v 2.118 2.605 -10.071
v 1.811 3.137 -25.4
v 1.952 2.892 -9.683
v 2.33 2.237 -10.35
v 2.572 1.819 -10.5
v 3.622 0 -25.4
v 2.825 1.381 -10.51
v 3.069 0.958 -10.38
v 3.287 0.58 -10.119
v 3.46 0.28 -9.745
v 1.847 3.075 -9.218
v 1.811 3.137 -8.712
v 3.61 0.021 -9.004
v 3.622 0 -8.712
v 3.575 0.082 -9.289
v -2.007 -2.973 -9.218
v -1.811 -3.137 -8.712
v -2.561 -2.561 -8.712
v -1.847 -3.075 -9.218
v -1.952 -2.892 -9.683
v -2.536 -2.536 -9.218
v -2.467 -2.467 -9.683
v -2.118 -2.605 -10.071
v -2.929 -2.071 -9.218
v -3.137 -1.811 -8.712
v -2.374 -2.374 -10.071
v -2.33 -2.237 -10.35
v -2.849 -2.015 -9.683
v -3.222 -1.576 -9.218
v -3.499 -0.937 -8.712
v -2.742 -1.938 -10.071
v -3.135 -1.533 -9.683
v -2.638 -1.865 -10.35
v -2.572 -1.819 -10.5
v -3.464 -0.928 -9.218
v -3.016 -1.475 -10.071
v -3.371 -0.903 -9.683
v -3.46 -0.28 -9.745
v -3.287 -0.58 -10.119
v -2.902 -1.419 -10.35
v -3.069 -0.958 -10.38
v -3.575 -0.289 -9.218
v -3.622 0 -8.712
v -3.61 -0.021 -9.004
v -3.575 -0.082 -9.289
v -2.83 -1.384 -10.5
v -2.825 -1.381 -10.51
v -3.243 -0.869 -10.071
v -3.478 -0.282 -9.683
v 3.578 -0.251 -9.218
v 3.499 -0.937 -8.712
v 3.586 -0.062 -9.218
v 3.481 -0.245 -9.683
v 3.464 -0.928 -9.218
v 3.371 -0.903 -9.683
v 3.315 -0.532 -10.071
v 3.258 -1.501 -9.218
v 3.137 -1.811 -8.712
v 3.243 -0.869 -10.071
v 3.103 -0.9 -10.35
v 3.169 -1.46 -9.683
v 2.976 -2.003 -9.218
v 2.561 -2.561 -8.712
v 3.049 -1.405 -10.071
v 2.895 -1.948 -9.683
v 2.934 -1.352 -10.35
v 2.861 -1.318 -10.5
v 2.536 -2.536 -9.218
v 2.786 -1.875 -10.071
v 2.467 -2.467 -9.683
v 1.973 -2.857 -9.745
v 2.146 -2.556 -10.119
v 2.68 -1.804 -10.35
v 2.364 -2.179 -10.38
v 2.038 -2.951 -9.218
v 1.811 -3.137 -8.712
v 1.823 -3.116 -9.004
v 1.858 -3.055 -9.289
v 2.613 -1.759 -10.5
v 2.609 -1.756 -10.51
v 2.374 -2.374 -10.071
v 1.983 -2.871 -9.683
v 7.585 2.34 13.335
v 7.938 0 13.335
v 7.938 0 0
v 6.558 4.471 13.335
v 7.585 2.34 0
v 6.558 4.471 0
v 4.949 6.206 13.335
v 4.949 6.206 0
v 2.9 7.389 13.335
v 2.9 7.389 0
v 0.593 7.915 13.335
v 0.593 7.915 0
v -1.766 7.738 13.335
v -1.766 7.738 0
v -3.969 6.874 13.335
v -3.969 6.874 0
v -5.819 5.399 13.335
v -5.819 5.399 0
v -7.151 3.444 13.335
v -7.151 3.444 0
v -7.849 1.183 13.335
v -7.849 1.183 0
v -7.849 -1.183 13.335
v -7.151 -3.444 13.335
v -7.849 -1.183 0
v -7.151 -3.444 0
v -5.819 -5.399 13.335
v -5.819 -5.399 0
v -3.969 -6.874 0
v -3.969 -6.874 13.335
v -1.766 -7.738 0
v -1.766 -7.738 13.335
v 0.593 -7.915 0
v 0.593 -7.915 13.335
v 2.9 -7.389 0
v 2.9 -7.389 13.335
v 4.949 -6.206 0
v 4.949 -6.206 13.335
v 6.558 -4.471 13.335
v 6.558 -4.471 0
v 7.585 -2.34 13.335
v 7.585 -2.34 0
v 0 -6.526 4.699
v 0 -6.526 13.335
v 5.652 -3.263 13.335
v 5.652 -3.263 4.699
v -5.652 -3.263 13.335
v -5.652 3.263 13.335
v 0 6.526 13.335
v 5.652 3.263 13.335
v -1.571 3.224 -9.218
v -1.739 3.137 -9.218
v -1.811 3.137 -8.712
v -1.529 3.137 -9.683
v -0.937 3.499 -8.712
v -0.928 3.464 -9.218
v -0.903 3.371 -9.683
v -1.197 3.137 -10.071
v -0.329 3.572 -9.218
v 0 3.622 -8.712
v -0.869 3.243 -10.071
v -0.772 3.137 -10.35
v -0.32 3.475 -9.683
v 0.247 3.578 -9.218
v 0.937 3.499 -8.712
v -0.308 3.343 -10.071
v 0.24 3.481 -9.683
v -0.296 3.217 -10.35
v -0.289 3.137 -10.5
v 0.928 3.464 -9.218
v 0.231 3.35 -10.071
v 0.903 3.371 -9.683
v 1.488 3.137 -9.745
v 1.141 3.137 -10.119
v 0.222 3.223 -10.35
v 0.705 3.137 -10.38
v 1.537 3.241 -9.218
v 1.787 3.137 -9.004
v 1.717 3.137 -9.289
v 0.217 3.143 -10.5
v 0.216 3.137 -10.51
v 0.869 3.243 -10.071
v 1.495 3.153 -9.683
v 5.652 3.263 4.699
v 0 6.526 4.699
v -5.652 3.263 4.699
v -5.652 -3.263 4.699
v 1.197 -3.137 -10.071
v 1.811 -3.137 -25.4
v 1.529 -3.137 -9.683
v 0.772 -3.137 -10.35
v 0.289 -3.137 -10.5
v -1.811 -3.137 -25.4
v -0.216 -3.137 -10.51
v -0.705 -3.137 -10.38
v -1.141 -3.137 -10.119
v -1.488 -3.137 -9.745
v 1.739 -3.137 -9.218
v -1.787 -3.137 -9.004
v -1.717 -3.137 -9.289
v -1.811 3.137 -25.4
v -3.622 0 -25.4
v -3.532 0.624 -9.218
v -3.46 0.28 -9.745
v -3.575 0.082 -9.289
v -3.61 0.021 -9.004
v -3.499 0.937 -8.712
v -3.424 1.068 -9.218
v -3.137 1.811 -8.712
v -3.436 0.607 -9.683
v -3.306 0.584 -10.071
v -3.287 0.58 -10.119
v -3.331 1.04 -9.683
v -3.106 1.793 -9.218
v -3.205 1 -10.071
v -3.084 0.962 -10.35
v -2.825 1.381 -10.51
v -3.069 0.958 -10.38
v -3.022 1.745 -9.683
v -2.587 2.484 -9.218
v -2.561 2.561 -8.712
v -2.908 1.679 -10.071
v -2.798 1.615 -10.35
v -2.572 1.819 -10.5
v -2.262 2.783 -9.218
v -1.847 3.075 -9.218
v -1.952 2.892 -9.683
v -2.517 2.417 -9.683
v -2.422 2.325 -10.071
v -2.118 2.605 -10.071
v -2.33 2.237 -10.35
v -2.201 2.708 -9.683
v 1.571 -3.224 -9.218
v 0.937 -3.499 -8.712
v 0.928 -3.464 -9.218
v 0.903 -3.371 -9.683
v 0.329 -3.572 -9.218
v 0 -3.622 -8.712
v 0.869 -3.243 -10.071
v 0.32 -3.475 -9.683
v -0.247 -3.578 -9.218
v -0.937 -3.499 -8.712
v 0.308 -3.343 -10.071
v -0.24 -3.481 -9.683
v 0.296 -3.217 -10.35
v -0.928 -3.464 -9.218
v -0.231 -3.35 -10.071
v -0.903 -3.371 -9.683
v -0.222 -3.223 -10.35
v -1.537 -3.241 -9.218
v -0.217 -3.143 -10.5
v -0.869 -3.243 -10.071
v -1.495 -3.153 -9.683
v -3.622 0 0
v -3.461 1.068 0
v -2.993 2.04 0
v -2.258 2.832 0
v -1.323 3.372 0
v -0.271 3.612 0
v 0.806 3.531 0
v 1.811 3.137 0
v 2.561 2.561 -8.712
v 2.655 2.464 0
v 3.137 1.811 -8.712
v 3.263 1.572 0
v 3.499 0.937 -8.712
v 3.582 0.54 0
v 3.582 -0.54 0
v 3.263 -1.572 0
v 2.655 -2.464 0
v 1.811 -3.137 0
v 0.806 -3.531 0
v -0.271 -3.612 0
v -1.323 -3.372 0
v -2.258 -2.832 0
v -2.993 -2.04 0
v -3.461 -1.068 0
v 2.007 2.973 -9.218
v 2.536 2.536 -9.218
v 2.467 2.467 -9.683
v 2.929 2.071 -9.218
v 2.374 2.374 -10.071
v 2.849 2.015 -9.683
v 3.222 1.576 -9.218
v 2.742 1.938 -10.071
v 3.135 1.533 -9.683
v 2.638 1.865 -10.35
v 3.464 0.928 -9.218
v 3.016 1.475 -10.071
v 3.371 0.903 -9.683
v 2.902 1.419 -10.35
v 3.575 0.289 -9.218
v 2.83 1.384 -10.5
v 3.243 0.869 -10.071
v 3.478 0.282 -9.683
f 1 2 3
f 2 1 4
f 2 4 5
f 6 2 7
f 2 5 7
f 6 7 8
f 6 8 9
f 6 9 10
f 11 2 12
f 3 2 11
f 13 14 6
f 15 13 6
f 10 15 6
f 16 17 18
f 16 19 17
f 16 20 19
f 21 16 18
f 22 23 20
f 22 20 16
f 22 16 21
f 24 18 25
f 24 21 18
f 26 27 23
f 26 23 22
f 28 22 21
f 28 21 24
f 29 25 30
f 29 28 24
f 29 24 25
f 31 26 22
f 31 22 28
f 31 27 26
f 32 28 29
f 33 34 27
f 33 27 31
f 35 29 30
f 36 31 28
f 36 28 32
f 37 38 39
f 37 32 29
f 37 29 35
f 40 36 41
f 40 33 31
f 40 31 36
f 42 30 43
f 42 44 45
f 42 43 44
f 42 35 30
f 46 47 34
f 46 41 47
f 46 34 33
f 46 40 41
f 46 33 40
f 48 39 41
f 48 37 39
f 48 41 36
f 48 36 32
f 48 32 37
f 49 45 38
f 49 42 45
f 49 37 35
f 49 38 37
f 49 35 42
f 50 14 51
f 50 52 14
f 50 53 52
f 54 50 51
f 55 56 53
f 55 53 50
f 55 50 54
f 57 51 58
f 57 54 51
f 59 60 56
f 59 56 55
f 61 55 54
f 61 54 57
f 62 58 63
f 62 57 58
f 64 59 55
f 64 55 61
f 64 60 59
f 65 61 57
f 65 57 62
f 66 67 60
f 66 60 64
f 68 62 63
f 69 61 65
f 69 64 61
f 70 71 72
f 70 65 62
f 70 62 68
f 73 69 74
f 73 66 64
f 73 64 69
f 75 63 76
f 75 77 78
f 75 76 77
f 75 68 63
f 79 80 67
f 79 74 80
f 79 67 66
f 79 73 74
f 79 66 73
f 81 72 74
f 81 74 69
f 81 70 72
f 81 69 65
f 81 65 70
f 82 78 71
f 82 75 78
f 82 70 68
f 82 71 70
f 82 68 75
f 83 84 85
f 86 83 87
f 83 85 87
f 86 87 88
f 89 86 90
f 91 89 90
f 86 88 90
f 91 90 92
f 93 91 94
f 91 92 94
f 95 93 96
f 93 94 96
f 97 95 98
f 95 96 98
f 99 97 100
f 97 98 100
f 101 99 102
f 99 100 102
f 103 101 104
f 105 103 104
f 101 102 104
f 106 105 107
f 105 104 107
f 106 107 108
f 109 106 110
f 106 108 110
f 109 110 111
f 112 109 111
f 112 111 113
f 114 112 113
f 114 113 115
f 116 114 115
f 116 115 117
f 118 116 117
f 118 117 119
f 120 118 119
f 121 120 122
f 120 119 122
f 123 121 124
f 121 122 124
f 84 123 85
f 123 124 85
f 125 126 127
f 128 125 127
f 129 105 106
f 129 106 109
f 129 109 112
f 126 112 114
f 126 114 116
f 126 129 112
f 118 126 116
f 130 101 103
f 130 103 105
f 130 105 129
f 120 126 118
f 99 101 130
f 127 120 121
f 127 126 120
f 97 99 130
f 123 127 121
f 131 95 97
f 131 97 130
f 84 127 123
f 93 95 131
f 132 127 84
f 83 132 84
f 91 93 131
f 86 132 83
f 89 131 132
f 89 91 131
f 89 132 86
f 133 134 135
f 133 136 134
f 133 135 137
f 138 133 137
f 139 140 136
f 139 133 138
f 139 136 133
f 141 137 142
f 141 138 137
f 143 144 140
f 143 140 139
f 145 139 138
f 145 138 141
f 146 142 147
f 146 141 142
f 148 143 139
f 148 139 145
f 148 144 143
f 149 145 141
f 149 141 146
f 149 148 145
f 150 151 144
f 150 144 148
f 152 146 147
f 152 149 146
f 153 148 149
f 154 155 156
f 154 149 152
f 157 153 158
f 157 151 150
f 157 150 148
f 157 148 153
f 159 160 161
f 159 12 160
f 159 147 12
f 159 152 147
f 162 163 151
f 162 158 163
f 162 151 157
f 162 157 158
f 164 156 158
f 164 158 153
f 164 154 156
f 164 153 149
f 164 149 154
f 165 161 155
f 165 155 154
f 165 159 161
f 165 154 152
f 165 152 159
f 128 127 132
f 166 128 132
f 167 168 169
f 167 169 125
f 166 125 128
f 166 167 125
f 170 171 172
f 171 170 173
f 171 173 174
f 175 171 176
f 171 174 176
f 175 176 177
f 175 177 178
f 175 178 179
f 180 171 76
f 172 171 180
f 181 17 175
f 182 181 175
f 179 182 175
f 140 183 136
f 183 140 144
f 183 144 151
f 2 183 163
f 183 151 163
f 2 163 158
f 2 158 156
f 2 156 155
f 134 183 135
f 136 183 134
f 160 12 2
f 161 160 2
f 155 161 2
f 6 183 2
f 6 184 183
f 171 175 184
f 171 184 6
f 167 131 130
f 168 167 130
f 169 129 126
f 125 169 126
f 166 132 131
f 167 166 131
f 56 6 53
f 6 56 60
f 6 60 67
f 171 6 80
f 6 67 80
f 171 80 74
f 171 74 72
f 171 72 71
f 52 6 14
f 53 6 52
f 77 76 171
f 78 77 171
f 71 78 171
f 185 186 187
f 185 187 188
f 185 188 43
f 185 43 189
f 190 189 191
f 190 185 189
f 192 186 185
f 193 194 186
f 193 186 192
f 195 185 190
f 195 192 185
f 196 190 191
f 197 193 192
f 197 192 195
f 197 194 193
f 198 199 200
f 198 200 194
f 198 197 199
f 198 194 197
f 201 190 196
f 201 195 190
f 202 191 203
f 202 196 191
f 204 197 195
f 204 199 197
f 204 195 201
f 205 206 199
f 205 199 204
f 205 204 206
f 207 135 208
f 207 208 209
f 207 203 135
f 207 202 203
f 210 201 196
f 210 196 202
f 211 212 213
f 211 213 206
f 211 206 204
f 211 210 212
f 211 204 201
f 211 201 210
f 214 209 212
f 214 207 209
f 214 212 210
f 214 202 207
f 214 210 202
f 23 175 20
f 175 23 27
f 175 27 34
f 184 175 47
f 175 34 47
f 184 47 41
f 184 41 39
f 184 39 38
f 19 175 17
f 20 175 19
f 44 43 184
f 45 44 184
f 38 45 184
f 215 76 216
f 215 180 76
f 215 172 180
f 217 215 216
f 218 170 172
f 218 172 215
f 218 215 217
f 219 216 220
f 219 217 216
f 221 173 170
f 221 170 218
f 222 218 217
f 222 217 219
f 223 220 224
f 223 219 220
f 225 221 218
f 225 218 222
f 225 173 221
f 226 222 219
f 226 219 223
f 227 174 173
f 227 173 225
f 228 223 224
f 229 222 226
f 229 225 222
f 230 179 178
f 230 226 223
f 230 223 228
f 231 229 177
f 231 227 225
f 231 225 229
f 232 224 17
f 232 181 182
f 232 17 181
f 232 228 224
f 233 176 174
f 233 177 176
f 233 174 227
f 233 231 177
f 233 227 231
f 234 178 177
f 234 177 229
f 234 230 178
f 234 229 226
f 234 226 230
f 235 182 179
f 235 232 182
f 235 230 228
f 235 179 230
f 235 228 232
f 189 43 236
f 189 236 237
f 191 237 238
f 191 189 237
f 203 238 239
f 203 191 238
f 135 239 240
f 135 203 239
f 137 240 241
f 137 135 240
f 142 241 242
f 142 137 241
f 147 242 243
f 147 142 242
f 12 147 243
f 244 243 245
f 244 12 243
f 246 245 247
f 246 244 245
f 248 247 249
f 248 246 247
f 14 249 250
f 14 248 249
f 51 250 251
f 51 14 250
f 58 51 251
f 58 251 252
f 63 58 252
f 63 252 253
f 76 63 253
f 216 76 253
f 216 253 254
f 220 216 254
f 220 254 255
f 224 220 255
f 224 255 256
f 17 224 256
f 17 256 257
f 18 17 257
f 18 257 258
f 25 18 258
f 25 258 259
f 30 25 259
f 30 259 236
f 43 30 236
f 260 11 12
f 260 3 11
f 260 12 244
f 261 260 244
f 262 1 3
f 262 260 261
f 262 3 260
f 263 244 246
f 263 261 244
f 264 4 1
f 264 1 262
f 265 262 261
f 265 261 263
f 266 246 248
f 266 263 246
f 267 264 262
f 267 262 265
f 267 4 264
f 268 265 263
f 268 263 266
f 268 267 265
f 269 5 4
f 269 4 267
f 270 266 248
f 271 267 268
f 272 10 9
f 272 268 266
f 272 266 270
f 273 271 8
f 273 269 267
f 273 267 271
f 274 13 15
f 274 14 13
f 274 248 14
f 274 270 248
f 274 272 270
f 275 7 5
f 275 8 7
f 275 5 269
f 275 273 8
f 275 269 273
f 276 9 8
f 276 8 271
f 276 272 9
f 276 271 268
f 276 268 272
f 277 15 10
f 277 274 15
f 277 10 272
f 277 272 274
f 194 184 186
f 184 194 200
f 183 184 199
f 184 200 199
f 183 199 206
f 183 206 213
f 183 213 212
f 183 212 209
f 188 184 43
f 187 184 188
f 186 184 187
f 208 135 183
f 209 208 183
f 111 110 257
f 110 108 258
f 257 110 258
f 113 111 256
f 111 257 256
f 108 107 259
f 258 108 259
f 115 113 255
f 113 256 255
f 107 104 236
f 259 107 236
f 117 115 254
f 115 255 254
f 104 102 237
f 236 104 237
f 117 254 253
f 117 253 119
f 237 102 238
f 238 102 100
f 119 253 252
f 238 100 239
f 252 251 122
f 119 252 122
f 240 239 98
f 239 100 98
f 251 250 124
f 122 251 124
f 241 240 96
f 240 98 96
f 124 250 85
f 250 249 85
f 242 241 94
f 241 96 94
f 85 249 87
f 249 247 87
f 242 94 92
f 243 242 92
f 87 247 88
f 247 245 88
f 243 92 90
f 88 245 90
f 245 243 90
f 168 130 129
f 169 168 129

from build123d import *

# Parameters (mm, degrees)
F0_R     = 7.9375
F1_DEPTH = 13.335
F3_DEPTH = 8.636
F5_DEPTH = 25.4


with BuildPart() as f1:
    # F0 (on Top) → F1 (new body)
    with BuildSketch(Plane.XY):
        Circle(F0_R)
    extrude(amount=F1_DEPTH)

    # F2 (on face) → F3 (cut)
    with BuildSketch(Plane.XY.offset(13.335)):
        Polygon((5.6515, -3.262895), (5.6515, 3.262895), (0, 6.52579), (-5.6515, 3.262895), (-5.6515, -3.262895), (0, -6.52579), align=None)
    extrude(amount=-F3_DEPTH, mode=Mode.SUBTRACT)

    # F4 (on face) → F5 (join)
    with BuildSketch(Plane(origin=(0, 0, 0), x_dir=(1, 0, 0), z_dir=(0, 0, -1))):
        Polygon((-1.81109, -3.1369), (1.81109, -3.1369), (3.62218, 0), (1.81109, 3.1369), (-1.81109, 3.1369), (-3.62218, 0), align=None)
    extrude(amount=F5_DEPTH)

    # F6 (on Front) → F7 (revolve)
    with BuildSketch(Plane.XZ):
        with BuildLine():
            Line((0, 0), (-3.62218, 0))
            Line((-3.62218, 0), (-3.62218, -8.7122))
            ThreePointArc((-3.62218, -8.7122), (-2.561268, -11.273468), (0, -12.33438))
            Line((0, -12.33438), (0, 0))
        make_face()
    revolve(axis=Axis((0, 0, -6.16719), (0, 0, -1)))


solid = f1.part
